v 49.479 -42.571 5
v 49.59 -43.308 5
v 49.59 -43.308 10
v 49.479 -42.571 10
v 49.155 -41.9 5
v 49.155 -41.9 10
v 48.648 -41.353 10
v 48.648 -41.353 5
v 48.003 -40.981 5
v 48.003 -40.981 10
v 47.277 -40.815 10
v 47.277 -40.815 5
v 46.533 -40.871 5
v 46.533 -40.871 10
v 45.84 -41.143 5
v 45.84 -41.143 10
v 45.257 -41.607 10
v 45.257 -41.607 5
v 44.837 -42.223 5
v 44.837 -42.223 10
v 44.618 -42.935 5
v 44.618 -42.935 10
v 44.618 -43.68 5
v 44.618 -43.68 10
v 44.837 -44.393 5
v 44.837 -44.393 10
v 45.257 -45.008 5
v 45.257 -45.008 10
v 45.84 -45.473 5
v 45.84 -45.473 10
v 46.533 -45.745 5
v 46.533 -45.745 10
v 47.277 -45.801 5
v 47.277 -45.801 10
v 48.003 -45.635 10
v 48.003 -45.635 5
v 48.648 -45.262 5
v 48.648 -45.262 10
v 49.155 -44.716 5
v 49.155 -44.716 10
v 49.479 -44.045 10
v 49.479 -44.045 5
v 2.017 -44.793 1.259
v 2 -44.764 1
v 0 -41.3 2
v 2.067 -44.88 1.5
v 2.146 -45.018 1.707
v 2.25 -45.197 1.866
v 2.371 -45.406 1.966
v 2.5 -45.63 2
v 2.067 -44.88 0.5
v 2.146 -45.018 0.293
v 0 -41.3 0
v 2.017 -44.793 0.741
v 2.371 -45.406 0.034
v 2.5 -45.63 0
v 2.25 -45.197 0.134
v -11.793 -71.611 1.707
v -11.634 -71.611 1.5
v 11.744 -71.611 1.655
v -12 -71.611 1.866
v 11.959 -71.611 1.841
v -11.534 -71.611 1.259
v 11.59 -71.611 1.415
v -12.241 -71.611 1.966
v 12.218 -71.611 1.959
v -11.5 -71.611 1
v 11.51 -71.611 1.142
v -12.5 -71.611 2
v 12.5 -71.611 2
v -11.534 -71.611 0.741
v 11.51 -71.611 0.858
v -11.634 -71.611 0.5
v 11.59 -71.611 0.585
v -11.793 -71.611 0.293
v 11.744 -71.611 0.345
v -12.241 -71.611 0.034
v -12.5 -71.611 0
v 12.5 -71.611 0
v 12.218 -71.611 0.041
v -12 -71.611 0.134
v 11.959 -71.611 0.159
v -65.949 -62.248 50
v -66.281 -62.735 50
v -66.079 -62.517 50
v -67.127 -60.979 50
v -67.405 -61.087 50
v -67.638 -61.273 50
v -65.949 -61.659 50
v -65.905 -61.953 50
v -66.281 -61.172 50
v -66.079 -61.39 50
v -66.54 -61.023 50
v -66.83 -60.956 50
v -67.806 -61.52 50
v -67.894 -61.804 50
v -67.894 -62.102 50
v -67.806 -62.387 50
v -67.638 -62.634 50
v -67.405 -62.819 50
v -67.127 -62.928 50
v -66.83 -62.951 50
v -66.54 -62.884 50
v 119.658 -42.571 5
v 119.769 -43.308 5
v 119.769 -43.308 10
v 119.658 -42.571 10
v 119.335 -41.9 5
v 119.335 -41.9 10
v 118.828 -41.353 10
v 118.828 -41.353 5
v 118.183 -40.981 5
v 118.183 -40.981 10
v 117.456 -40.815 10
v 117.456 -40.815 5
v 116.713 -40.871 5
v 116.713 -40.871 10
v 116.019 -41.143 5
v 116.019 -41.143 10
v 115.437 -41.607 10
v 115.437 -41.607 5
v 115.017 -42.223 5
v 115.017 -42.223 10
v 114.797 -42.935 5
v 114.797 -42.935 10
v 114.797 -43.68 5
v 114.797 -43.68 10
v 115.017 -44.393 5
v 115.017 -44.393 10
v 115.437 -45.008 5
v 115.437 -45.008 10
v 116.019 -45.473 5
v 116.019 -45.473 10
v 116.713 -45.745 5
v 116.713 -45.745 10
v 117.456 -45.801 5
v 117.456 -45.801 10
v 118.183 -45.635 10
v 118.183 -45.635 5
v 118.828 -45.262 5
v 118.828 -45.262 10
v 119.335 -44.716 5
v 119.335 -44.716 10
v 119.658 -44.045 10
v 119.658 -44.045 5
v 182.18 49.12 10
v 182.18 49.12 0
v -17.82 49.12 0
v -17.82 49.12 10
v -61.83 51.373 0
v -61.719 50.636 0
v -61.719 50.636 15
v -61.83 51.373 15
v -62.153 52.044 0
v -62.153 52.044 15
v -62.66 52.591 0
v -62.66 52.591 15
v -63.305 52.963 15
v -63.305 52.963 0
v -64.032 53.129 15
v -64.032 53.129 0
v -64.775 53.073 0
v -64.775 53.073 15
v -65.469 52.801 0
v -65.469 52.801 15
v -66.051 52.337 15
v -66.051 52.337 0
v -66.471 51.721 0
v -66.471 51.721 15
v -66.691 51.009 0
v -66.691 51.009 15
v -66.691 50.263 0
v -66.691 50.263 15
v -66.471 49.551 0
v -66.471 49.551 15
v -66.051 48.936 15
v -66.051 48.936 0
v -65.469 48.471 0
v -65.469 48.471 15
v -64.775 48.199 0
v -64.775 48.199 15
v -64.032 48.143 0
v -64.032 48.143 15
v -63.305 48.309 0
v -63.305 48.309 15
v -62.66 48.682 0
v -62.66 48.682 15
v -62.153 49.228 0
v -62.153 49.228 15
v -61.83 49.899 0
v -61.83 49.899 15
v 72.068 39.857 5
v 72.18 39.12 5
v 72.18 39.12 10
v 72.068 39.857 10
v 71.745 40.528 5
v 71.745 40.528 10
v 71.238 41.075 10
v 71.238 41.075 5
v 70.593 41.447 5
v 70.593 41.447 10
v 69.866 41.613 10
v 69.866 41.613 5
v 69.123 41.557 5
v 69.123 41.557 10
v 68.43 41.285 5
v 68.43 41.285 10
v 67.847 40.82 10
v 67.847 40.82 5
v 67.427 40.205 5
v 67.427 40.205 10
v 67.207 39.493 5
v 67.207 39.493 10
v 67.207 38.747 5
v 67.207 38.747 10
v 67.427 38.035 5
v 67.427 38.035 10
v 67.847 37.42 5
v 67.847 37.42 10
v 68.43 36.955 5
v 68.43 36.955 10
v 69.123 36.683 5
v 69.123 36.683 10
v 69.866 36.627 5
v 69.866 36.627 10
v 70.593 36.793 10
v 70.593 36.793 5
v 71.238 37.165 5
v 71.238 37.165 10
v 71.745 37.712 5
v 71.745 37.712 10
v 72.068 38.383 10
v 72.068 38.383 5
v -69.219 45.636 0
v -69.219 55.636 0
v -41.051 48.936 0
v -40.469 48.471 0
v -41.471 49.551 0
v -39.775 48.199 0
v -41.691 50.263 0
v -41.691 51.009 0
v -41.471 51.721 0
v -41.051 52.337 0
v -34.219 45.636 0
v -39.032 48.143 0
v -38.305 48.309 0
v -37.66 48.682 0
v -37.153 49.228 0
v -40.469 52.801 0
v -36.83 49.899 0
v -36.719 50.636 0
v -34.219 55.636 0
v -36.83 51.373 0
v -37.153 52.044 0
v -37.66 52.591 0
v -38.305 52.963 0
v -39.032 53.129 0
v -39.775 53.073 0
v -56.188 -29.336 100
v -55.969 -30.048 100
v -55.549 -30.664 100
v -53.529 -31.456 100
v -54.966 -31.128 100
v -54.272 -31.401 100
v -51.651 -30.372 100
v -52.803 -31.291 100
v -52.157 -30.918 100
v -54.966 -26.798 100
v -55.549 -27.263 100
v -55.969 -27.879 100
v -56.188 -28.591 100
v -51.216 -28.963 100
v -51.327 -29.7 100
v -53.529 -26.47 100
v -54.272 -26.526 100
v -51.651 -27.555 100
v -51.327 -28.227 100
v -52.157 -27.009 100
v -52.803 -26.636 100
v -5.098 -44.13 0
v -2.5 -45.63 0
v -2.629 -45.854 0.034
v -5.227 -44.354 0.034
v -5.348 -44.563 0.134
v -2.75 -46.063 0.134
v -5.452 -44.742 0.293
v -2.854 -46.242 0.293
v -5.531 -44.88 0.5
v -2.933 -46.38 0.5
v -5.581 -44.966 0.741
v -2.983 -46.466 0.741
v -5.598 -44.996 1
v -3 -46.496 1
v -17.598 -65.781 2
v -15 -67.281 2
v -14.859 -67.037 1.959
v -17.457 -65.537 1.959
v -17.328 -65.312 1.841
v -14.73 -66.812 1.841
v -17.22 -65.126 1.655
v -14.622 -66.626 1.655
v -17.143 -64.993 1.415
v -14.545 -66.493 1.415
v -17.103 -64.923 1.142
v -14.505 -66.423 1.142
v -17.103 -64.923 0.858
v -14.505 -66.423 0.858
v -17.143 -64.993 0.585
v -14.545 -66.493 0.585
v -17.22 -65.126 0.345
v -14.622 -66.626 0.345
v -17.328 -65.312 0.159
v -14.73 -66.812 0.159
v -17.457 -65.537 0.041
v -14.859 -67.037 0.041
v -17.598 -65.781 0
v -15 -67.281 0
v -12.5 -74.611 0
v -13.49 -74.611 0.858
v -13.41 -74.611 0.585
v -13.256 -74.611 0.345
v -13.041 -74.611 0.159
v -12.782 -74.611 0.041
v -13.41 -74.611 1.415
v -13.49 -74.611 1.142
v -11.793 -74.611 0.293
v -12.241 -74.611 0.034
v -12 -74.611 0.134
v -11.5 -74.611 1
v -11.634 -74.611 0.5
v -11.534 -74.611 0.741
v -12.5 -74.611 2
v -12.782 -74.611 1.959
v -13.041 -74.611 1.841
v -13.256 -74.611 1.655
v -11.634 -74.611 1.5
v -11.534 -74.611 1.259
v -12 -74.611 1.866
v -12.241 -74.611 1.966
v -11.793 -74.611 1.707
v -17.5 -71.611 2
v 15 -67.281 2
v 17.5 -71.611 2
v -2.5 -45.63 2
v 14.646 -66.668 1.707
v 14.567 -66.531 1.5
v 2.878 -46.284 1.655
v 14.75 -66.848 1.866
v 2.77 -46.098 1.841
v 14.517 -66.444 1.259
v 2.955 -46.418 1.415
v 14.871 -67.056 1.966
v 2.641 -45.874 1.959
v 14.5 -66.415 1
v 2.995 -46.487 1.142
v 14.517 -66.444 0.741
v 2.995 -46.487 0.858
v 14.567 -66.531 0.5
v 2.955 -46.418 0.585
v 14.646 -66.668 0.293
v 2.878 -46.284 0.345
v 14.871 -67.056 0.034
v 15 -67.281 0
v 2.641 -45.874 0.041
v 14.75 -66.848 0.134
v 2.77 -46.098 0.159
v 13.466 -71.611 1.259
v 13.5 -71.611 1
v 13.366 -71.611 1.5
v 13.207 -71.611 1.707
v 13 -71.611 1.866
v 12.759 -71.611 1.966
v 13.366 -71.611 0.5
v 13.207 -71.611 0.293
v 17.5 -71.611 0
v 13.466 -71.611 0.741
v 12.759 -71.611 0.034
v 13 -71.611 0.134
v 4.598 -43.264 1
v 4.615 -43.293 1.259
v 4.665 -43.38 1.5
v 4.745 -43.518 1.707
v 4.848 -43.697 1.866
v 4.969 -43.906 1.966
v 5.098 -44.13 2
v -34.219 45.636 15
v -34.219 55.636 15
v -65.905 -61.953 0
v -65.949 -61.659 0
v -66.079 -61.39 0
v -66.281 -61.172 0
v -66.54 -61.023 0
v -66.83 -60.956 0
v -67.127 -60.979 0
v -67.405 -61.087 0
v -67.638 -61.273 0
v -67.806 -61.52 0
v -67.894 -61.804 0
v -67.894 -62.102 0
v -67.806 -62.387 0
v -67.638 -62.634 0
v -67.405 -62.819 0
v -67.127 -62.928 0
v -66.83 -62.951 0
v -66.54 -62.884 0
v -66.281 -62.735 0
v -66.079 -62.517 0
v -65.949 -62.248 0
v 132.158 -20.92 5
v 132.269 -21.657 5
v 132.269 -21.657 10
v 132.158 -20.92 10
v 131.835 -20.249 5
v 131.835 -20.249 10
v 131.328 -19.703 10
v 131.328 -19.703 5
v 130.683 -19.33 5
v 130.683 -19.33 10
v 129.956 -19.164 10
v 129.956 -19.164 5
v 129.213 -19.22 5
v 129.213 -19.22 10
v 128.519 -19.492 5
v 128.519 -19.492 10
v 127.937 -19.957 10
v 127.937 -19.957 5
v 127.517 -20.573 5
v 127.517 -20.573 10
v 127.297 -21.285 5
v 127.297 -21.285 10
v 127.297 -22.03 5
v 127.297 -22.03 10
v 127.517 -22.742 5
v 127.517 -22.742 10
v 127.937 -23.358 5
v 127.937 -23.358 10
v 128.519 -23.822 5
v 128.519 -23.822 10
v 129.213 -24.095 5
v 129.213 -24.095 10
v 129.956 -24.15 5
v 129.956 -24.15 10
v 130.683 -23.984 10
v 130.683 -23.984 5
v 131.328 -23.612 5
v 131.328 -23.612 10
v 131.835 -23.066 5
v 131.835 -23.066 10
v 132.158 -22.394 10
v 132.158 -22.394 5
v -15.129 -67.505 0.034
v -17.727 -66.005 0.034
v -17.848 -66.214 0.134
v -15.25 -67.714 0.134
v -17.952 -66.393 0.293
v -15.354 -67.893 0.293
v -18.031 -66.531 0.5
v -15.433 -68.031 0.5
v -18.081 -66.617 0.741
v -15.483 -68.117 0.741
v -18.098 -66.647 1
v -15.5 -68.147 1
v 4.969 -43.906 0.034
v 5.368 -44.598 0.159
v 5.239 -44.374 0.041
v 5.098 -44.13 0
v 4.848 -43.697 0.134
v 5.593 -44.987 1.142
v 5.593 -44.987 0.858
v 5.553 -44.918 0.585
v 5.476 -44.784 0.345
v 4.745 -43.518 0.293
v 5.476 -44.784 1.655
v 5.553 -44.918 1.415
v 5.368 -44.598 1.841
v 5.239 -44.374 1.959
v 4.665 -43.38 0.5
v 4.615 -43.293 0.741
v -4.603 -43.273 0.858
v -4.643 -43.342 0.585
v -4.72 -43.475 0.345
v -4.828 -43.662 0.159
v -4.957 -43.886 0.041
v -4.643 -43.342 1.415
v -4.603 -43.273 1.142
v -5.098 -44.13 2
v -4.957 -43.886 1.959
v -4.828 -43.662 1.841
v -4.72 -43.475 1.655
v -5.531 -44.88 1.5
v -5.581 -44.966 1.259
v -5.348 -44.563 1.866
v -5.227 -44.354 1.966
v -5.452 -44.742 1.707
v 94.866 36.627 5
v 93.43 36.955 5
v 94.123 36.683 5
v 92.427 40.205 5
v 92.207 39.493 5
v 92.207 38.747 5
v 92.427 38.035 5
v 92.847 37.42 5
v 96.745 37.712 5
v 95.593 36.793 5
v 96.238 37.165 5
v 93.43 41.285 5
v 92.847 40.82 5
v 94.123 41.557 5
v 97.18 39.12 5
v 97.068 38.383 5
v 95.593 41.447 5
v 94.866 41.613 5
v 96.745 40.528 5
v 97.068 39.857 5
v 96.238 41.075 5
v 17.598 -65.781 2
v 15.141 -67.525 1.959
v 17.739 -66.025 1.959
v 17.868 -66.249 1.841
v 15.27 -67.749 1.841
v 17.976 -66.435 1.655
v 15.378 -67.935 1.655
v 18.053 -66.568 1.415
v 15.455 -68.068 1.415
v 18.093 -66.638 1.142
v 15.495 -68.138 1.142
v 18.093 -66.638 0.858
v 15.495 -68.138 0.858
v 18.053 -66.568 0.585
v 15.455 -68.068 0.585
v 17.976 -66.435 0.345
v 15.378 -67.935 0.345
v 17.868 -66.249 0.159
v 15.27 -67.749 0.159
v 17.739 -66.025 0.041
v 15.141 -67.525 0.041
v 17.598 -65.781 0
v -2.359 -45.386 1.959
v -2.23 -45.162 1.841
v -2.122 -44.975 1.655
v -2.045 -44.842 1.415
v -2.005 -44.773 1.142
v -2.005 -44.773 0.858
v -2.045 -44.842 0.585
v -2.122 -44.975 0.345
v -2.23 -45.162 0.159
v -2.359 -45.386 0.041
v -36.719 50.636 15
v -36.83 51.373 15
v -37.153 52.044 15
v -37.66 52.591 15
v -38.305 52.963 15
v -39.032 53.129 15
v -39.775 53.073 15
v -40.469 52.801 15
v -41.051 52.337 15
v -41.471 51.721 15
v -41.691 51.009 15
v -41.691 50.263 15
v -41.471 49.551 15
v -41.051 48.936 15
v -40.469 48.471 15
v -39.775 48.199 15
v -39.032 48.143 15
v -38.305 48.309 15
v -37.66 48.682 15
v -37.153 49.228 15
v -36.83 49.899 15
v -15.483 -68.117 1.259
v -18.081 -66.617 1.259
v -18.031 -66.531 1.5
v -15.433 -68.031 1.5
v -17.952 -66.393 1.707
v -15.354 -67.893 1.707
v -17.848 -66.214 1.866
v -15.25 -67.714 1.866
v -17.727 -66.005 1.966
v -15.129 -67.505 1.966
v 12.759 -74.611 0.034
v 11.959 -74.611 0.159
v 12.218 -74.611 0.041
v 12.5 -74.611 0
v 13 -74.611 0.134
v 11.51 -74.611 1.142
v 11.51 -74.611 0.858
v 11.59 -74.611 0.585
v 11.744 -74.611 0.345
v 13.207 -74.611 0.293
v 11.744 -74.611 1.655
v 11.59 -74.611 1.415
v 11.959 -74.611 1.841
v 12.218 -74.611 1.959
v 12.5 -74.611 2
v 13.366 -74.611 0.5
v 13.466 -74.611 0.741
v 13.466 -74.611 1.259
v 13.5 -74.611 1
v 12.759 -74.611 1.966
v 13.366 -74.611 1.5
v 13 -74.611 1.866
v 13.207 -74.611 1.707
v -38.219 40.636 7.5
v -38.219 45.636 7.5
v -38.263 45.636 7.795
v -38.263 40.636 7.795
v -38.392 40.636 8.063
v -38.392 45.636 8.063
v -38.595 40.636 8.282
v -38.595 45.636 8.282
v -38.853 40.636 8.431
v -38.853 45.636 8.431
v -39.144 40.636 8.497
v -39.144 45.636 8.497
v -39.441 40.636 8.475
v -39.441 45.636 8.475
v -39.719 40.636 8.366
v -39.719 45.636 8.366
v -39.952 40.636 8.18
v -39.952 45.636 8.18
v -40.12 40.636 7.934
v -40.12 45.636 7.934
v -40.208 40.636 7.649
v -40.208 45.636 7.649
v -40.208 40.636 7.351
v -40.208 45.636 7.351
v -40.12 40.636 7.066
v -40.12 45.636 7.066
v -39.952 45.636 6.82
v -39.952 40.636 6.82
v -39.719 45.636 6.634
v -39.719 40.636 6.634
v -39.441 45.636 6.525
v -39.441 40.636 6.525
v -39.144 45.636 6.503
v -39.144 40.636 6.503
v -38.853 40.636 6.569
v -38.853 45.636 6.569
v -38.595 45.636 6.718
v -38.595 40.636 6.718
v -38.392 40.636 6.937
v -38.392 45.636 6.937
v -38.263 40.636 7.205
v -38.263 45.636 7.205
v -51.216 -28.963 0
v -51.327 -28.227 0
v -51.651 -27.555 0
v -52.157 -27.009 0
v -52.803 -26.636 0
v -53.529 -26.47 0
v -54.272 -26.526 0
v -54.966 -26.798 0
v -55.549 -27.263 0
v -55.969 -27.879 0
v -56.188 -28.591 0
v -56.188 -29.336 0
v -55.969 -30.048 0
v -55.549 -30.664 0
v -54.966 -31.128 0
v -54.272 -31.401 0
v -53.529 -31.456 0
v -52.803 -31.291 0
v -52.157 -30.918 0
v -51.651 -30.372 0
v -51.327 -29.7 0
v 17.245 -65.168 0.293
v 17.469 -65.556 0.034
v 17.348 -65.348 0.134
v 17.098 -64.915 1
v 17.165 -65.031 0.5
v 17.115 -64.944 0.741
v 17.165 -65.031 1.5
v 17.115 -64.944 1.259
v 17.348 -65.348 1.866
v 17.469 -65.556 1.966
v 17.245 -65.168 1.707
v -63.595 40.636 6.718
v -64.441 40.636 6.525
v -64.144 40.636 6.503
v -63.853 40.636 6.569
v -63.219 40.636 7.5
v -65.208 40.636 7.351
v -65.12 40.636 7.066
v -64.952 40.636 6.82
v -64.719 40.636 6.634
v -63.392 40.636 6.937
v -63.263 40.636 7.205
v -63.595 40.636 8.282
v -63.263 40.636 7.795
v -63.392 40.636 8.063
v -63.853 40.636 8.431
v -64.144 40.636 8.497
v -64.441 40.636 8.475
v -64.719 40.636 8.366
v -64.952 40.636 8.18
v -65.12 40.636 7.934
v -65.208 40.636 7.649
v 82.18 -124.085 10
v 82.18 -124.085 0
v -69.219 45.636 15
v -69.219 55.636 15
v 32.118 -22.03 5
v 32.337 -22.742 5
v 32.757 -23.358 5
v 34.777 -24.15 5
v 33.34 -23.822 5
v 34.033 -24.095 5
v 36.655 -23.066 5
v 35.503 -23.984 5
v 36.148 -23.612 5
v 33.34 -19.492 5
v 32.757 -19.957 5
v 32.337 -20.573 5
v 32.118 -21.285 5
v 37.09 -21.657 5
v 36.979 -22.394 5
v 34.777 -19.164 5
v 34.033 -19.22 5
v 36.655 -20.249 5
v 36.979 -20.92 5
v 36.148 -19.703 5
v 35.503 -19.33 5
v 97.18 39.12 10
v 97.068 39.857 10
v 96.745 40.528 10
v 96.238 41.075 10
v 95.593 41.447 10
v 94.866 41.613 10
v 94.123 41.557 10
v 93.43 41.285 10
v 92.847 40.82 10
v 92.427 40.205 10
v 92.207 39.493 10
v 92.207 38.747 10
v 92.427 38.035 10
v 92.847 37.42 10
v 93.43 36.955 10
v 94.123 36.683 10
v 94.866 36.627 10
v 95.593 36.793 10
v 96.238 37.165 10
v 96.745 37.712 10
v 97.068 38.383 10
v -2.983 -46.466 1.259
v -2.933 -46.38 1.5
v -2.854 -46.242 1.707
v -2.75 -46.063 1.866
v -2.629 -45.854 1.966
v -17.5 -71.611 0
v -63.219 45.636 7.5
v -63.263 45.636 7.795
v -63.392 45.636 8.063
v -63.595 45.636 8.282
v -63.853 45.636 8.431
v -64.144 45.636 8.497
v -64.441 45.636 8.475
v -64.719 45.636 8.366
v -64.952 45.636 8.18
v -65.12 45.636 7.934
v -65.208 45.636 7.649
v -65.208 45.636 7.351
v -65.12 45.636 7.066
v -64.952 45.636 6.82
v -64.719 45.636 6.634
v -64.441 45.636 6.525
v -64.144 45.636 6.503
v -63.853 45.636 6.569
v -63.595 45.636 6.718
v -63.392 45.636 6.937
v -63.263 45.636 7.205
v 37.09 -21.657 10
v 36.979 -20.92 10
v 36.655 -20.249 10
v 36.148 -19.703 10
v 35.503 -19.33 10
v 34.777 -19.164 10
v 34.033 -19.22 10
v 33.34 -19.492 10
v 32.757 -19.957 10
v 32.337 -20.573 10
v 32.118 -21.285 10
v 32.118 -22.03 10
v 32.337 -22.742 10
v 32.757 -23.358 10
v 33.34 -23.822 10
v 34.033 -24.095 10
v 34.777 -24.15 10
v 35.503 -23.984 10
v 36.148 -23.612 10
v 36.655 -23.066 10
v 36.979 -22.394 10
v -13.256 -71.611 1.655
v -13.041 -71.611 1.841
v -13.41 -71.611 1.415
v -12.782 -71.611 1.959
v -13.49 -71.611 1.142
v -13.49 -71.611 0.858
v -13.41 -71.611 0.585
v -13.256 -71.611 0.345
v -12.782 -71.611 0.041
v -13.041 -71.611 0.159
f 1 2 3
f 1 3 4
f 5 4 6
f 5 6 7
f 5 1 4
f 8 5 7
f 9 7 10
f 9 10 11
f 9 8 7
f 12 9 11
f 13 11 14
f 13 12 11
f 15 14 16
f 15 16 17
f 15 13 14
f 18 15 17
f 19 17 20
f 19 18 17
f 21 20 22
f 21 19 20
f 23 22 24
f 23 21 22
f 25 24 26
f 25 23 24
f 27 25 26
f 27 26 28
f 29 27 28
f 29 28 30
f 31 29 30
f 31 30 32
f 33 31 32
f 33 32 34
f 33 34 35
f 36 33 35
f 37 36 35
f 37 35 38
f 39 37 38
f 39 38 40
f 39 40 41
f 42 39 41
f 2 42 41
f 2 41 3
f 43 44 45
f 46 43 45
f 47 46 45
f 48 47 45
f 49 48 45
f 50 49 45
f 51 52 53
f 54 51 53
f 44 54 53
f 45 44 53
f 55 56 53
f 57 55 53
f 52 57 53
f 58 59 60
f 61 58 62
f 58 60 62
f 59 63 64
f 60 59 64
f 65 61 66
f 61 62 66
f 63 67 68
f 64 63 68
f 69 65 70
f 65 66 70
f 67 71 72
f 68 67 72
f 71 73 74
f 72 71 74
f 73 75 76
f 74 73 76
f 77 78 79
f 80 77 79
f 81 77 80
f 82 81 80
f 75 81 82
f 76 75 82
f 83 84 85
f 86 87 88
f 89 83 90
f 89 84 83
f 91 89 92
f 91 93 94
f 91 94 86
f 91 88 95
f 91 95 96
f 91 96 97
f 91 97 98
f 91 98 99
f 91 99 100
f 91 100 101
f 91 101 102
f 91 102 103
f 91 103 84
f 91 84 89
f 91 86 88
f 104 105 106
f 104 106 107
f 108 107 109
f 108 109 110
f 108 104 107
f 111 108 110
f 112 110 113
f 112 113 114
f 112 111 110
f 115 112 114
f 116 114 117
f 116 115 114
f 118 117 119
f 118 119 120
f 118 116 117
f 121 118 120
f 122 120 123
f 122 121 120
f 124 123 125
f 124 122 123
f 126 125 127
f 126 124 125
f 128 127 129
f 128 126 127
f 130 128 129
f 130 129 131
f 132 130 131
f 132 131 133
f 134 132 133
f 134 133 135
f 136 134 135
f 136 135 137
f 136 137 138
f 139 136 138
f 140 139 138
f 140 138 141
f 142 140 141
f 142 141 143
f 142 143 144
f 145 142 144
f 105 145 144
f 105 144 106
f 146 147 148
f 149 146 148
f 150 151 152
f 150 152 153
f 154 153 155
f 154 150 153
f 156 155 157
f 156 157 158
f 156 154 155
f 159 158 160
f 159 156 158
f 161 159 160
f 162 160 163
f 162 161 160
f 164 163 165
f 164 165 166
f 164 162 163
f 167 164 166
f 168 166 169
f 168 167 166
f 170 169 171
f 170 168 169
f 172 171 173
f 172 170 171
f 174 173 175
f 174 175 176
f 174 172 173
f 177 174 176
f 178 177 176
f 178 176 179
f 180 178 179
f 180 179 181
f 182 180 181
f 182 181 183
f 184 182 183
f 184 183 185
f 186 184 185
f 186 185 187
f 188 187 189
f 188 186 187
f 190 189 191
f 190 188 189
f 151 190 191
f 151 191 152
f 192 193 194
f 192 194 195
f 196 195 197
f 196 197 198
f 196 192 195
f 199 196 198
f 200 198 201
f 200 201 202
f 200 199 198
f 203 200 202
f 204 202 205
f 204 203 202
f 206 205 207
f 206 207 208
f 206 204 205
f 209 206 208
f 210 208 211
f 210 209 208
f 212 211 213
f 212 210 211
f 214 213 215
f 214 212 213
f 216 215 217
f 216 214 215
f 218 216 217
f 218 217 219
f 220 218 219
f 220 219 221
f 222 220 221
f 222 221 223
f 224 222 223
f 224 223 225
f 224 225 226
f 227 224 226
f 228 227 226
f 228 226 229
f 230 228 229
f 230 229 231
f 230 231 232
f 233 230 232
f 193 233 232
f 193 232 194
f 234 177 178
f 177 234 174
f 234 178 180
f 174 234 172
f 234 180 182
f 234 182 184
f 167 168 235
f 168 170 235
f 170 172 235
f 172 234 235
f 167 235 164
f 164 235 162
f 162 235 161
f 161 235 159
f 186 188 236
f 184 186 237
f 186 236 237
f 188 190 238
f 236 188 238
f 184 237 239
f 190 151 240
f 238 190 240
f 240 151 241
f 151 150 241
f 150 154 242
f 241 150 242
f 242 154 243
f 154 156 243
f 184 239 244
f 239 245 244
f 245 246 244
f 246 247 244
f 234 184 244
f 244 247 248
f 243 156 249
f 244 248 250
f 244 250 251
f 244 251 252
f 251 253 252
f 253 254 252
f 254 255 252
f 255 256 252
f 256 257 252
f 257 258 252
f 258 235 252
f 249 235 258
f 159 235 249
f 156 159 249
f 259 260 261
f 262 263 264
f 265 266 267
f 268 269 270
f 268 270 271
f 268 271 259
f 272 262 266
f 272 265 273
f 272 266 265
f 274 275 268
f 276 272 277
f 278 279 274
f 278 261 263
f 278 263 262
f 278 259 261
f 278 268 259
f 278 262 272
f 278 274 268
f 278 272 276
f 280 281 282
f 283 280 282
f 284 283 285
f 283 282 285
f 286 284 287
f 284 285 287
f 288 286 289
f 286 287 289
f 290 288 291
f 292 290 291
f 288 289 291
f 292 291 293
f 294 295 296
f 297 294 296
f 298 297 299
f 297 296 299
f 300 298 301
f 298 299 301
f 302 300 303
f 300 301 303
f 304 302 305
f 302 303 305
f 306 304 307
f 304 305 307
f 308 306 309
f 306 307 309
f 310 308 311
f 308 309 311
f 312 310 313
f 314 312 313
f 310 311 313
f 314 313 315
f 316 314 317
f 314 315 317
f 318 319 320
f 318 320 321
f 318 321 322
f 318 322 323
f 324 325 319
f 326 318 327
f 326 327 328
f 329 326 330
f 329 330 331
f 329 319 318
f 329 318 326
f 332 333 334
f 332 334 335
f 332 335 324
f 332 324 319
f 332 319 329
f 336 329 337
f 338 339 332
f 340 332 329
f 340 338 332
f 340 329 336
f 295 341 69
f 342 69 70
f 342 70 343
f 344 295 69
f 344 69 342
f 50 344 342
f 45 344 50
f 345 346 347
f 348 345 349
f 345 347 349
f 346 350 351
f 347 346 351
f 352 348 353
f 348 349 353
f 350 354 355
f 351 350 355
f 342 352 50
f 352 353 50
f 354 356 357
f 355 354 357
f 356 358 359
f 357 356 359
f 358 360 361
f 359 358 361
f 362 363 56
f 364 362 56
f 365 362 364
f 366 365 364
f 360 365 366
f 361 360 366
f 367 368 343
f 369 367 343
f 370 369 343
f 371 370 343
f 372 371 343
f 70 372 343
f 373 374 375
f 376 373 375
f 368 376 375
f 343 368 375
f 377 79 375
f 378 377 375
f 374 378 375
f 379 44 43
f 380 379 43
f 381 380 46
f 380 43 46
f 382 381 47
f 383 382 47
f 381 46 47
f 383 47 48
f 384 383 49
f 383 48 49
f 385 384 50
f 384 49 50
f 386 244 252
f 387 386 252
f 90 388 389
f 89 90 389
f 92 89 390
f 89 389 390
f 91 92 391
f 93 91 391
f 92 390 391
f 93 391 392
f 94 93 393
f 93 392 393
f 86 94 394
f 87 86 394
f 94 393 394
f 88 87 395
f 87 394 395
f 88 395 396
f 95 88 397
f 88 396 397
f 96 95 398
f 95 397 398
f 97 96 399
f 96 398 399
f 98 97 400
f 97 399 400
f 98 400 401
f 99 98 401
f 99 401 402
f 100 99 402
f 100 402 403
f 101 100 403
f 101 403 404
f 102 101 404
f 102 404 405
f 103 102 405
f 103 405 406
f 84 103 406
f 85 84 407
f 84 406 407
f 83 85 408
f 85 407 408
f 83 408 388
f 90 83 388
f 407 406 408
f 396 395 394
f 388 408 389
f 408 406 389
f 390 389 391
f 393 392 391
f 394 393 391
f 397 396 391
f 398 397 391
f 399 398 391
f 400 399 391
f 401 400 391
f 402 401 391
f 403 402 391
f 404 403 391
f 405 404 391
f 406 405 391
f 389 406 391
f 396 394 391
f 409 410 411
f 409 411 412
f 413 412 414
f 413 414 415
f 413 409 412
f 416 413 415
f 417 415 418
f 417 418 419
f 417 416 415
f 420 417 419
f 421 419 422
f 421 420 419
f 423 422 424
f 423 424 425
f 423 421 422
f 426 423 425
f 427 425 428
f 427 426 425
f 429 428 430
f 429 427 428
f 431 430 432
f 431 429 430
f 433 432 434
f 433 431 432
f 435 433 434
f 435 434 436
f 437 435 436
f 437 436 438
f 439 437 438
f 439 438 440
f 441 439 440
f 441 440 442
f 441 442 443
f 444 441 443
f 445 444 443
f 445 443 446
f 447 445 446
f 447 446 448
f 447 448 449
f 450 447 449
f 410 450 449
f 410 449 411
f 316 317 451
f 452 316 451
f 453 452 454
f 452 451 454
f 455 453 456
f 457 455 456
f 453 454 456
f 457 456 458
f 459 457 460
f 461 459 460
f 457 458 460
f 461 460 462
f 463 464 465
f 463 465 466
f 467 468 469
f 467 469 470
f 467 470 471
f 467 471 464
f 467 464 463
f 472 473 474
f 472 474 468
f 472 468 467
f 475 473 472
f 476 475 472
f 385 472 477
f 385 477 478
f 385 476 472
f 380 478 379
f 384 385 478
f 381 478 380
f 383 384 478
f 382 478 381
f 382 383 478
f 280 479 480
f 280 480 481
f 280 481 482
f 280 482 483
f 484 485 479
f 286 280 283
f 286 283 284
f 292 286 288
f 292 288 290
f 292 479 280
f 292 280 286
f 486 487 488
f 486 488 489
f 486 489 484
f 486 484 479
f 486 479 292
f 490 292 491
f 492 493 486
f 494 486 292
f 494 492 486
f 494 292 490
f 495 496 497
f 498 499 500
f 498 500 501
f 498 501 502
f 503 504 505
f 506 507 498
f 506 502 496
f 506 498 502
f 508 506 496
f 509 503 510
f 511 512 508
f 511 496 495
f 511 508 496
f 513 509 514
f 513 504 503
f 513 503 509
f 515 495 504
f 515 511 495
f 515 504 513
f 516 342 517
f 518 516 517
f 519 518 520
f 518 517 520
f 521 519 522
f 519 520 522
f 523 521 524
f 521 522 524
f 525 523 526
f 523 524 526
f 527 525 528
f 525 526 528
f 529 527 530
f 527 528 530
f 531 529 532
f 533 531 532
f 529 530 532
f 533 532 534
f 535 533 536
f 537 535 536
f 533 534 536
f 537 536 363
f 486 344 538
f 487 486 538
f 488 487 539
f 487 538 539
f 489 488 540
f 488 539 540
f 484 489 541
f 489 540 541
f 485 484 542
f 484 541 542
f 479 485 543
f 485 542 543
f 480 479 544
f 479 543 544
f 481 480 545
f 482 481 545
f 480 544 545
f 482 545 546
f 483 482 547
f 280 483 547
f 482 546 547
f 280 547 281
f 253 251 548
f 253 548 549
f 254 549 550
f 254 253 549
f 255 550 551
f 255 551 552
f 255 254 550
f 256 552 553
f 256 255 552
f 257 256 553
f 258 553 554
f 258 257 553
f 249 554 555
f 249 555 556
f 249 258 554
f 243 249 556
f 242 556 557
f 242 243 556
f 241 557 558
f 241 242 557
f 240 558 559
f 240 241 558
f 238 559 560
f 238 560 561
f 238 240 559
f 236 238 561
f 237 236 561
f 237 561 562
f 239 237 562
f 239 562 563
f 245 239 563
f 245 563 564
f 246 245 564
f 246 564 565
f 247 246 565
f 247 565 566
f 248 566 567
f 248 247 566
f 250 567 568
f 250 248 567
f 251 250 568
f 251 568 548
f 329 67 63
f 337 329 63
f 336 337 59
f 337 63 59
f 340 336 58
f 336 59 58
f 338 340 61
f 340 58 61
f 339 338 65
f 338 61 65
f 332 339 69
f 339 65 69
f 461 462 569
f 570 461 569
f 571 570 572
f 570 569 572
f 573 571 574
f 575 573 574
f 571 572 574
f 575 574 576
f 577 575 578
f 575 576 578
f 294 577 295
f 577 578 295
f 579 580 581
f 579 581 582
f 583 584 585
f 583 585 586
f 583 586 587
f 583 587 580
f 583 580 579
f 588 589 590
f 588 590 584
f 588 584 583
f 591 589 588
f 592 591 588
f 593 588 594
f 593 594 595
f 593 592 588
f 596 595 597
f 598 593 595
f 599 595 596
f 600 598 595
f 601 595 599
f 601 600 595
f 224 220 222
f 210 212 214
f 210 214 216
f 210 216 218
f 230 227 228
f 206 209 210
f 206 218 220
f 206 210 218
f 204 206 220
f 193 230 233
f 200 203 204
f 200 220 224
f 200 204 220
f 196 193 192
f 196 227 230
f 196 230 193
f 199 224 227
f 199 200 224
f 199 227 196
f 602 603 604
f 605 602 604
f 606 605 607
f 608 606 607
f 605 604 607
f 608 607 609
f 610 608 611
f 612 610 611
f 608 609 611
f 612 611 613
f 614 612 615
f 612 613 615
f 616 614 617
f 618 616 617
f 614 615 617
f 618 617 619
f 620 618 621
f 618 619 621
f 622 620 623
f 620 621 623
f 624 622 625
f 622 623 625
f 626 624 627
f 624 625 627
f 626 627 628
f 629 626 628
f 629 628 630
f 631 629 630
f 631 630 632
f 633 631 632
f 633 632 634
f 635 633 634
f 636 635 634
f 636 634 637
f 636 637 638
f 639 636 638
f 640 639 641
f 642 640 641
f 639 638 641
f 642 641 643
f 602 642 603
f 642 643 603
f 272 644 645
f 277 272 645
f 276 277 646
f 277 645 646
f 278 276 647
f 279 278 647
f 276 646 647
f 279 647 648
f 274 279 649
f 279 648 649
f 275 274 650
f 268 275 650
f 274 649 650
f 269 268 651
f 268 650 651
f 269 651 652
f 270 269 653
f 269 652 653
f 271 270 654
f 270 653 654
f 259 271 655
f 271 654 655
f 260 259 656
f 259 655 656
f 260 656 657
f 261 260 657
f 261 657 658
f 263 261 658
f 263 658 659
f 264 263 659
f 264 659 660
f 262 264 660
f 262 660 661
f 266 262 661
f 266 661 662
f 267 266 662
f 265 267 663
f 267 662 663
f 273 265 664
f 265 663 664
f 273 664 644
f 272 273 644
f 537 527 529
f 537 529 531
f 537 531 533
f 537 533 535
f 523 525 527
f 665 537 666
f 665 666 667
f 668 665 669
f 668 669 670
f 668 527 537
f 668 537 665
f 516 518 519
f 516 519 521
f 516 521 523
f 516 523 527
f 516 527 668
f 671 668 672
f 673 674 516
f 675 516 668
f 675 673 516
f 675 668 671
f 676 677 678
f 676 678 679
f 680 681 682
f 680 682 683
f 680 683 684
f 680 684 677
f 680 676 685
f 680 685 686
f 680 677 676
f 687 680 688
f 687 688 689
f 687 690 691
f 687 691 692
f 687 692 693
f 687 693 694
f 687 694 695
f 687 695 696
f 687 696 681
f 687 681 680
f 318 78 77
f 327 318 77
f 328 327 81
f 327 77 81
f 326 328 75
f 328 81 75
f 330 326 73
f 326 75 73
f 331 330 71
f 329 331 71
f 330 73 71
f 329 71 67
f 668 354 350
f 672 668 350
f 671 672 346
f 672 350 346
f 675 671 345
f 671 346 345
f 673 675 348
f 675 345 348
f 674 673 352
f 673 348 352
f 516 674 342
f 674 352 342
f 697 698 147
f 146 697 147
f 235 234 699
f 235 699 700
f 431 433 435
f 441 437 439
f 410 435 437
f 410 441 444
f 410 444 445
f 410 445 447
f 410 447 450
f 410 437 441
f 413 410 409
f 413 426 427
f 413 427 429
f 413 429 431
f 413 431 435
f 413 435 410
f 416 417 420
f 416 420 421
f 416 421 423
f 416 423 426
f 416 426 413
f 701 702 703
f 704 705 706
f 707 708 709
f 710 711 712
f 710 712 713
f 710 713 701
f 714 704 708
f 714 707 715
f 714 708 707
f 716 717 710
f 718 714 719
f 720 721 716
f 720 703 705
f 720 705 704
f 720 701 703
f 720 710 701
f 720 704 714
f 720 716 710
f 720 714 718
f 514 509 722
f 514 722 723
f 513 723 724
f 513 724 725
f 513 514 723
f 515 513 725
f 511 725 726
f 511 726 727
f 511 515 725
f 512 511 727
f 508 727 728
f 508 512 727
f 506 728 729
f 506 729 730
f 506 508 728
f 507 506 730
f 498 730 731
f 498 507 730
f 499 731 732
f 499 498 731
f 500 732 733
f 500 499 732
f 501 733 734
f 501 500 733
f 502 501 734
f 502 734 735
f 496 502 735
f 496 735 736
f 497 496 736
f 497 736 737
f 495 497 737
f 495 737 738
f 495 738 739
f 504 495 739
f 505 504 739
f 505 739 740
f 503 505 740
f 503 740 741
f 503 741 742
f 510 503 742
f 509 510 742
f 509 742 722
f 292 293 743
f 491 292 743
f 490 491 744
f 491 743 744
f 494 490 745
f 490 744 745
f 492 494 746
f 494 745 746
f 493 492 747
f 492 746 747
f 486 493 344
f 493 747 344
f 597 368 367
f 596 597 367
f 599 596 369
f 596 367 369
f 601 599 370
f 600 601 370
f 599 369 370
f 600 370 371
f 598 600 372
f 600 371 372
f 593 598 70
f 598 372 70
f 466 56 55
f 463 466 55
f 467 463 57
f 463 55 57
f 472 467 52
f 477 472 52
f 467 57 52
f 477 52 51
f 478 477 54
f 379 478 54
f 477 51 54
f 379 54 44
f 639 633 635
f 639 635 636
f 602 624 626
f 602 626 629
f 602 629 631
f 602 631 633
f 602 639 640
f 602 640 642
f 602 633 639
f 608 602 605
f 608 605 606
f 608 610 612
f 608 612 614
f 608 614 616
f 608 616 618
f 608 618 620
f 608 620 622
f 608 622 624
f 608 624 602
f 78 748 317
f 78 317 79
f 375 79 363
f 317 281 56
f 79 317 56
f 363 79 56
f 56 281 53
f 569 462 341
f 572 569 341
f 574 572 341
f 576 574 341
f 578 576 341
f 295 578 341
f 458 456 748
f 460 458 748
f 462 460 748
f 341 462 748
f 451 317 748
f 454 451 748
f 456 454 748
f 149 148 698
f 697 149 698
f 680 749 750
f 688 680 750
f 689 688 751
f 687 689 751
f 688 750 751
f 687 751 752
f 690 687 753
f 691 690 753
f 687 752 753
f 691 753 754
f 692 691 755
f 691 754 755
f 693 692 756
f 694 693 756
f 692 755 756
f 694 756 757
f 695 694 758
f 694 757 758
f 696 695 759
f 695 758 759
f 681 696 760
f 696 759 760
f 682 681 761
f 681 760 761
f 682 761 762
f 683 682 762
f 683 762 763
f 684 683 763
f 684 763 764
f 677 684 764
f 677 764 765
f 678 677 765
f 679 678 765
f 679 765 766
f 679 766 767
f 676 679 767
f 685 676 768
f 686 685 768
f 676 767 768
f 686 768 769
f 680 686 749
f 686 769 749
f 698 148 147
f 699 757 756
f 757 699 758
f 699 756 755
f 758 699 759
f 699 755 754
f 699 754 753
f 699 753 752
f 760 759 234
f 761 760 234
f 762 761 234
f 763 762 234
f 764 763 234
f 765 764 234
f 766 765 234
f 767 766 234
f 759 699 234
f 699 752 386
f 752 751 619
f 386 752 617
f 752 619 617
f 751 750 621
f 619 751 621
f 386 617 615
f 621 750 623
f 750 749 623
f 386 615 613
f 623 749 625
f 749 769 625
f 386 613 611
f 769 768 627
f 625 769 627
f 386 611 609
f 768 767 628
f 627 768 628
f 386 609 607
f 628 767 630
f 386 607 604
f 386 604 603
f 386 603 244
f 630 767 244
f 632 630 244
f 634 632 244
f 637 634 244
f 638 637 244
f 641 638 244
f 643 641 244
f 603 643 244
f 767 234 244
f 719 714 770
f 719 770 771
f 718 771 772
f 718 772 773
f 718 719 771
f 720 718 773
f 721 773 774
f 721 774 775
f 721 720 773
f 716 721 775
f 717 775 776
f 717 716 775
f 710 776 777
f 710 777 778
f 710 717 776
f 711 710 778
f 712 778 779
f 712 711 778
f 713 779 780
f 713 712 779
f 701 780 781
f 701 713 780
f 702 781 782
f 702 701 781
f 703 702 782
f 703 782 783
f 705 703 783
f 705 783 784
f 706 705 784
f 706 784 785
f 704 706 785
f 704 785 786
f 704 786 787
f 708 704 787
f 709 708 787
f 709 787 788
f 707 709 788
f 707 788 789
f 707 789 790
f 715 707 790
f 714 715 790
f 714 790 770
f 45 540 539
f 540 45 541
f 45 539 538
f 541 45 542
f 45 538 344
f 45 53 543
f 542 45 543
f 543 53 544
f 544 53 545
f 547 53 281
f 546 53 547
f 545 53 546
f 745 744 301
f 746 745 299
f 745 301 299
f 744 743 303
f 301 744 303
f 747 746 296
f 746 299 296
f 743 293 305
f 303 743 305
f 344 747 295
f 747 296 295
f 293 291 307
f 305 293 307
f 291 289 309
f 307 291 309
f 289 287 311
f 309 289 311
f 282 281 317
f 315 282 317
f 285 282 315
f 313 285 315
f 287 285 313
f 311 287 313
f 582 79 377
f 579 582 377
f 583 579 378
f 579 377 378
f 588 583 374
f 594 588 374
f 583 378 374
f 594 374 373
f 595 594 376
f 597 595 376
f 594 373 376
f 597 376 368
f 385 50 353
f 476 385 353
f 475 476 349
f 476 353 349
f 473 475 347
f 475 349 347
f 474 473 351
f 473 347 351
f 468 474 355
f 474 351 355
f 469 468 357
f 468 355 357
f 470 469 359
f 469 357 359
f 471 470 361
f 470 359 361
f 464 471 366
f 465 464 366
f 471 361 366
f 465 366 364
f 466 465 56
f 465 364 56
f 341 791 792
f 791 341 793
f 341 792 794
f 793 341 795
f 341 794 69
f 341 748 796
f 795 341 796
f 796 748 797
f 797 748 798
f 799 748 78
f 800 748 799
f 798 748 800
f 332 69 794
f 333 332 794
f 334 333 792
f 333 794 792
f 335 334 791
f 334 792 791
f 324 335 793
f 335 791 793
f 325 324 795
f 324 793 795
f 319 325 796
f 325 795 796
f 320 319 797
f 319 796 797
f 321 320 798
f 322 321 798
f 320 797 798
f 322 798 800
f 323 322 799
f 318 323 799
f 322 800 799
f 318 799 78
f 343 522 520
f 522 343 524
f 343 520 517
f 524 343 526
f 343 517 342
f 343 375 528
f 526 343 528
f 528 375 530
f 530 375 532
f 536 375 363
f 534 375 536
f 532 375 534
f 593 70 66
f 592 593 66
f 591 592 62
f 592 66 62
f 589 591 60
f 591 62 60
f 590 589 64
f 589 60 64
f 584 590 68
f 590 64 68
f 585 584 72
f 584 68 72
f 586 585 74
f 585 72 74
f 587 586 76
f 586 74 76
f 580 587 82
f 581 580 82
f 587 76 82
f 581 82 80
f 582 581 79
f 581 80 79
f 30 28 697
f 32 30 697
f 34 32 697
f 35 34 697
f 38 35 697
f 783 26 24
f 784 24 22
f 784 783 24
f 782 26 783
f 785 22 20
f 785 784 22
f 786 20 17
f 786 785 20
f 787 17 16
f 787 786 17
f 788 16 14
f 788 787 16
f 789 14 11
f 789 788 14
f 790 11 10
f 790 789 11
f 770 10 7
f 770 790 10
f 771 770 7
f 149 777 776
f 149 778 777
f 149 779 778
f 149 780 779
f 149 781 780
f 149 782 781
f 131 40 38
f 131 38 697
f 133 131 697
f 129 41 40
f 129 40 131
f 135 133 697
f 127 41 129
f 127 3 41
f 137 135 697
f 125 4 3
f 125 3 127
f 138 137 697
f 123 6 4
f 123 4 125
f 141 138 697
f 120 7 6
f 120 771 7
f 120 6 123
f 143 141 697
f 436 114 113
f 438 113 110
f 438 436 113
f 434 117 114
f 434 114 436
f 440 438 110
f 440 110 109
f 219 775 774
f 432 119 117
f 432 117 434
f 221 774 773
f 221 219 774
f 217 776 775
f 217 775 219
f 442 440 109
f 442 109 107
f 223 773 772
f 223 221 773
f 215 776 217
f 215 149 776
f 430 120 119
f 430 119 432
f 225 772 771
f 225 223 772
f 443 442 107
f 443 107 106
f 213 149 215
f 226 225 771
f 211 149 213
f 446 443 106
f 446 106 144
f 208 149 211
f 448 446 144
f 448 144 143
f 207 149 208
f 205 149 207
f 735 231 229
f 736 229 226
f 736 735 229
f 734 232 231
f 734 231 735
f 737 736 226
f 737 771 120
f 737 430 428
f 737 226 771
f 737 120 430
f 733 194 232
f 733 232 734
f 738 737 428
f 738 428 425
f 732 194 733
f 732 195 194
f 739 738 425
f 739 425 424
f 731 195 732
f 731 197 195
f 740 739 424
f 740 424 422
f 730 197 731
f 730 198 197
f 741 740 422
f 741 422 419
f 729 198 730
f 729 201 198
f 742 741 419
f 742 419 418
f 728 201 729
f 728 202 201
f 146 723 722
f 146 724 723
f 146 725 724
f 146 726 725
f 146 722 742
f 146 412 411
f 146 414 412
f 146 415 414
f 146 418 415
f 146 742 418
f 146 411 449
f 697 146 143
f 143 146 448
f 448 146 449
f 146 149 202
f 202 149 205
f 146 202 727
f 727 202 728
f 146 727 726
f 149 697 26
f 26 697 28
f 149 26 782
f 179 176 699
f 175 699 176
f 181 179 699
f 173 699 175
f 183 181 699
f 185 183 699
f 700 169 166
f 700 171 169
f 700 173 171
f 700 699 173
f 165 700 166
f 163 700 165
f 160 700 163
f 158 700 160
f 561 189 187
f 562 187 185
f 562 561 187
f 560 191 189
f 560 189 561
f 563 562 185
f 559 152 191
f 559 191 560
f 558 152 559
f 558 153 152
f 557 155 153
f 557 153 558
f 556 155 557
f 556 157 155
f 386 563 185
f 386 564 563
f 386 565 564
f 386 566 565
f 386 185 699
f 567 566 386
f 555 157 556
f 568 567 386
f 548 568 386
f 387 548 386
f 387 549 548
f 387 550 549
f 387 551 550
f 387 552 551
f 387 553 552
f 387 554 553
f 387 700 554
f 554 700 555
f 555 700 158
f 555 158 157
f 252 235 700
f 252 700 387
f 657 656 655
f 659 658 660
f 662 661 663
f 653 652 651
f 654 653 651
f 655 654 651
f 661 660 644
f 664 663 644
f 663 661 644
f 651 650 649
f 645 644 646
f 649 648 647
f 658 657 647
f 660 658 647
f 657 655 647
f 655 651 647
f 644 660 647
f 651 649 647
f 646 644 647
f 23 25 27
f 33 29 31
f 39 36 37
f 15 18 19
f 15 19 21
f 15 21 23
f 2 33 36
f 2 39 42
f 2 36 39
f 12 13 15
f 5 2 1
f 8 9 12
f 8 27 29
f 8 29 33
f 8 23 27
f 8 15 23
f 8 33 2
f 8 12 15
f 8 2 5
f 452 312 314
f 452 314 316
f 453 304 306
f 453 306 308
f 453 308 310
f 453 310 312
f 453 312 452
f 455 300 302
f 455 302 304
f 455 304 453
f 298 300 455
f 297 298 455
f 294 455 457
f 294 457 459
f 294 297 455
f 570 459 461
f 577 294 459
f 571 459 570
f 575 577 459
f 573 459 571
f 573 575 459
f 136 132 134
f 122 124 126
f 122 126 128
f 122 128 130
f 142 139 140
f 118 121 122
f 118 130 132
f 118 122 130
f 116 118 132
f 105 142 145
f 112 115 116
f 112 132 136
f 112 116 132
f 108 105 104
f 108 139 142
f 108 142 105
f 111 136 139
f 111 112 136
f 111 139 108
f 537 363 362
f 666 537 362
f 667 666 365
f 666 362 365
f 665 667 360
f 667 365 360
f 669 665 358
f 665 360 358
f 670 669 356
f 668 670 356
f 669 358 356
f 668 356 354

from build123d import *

# Parameters (mm, degrees)
F0_R      = 2.5
F1_DEPTH  = 100
F0_W      = 35
F0_H      = 10
F2_DEPTH  = 15
F3_R      = 1
F4_DEPTH  = 5
F5_DEPTH  = 10
F6_DEPTH  = 5
F7_R      = 1
F8_DEPTH  = 50
F9_DEPTH  = 2
F11_DEPTH = 3
F13_COUNT = 3


with BuildPart() as f1:
    # F0 (on Top) → F1 (new body)
    with BuildSketch(Plane.XY):
        with Locations((-53.7161678076, -28.9633926004)):
            Circle(F0_R)
    extrude(amount=F1_DEPTH)


with BuildPart() as f2:
    # F0 (on Top) → F2 (new body)
    with BuildSketch(Plane.XY):
        with Locations((-51.7187061906, 50.6360839307)):
            Rectangle(F0_W, F0_H)
        with Locations((-64.2187061906, 50.6360839307)):
            Circle(F0_R, mode=Mode.SUBTRACT)
        with Locations((-39.2187061906, 50.6360839307)):
            Circle(F0_R, mode=Mode.SUBTRACT)
    extrude(amount=F2_DEPTH)

    # F3 (on face) → F4 (join)
    with BuildSketch(Plane.XZ.offset(-45.6360839307)):
        with Locations((-64.2187061906, 7.5)):
            Circle(F3_R)
        with Locations((-39.2187061906, 7.5)):
            Circle(F3_R)
    extrude(amount=F4_DEPTH)


with BuildPart() as f5:
    # F0 (on Top) → F5 (new body)
    with BuildSketch(Plane.XY):
        Polygon((82.1795048314, -124.0850920262), (182.1795048314, 49.1199887307), (-17.8204951686, 49.1199887307), align=None)
        with Locations((47.0897588693, -43.3078691951)):
            Circle(F0_R, mode=Mode.SUBTRACT)
        with Locations((117.2692507936, -43.3078691951)):
            Circle(F0_R, mode=Mode.SUBTRACT)
        with Locations((34.5897588693, -21.6572341004)):
            Circle(F0_R, mode=Mode.SUBTRACT)
        with Locations((129.7692507936, -21.6572341004)):
            Circle(F0_R, mode=Mode.SUBTRACT)
        with Locations((69.6795048314, 39.1199887307)):
            Circle(F0_R, mode=Mode.SUBTRACT)
        with Locations((94.6795048314, 39.1199887307)):
            Circle(F0_R, mode=Mode.SUBTRACT)
    extrude(amount=F5_DEPTH)

    # F0 (on Top) → F6 (join)
    with BuildSketch(Plane.XY):
        with Locations((94.6795048314, 39.1199887307)):
            Circle(F0_R)
        with Locations((69.6795048314, 39.1199887307)):
            Circle(F0_R)
        with Locations((129.7692507936, -21.6572341004)):
            Circle(F0_R)
        with Locations((117.2692507936, -43.3078691951)):
            Circle(F0_R)
        with Locations((47.0897588693, -43.3078691951)):
            Circle(F0_R)
        with Locations((34.5897588693, -21.6572341004)):
            Circle(F0_R)
    extrude(amount=F6_DEPTH)


with BuildPart() as f8:
    # F7 (on Top) → F8 (new body)
    with BuildSketch(Plane.XY):
        with Locations((-66.9048428535, -61.9534403086)):
            Circle(F7_R)
    extrude(amount=F8_DEPTH)


with BuildPart() as f9:
    # F7 (on Top) → F9 (new body)
    with BuildSketch(Plane.XY):
        Polygon((-17.5, -71.6106578587), (17.5, -71.6106578587), (0, -41.2997687263), align=None)
    extrude(amount=F9_DEPTH)

    # F10 (on face) → F11 (join)
    with BuildSketch(Plane.XZ.offset(71.6106578587)):
        with BuildLine():
            ThreePointArc((-12.5, 0), (-11.7928932188, 0.2928932188), (-11.5, 1))
            ThreePointArc((-11.5, 1), (-11.7928932147, 1.7071067771), (-12.4999999883, 2))
            ThreePointArc((-12.4999999883, 2), (-13.5, 1.0000000058), (-12.5, 0))
        make_face()
        with BuildLine():
            ThreePointArc((13.5, 1), (13.2071067812, 1.7071067812), (12.5, 2))
            ThreePointArc((12.5, 2), (11.5, 1.0000000064), (12.4999999871, 0))
            ThreePointArc((12.4999999871, 0), (13.2071067766, 0.2928932143), (13.5, 1))
        make_face()
    extrude(amount=F11_DEPTH)

    # F13: F9 ×3 about axis
    f13_axis = Axis((0, -61.5070281479, 1.7078060191), (0, 0, 1))


with BuildPart() as f9_1:
    add(f9.part)
    for i in range(1, F13_COUNT):
        add(f9.part.rotate(f13_axis, i * 360 / F13_COUNT))


solid = Compound([f1.part, f2.part, f5.part, f8.part, f9_1.part])
